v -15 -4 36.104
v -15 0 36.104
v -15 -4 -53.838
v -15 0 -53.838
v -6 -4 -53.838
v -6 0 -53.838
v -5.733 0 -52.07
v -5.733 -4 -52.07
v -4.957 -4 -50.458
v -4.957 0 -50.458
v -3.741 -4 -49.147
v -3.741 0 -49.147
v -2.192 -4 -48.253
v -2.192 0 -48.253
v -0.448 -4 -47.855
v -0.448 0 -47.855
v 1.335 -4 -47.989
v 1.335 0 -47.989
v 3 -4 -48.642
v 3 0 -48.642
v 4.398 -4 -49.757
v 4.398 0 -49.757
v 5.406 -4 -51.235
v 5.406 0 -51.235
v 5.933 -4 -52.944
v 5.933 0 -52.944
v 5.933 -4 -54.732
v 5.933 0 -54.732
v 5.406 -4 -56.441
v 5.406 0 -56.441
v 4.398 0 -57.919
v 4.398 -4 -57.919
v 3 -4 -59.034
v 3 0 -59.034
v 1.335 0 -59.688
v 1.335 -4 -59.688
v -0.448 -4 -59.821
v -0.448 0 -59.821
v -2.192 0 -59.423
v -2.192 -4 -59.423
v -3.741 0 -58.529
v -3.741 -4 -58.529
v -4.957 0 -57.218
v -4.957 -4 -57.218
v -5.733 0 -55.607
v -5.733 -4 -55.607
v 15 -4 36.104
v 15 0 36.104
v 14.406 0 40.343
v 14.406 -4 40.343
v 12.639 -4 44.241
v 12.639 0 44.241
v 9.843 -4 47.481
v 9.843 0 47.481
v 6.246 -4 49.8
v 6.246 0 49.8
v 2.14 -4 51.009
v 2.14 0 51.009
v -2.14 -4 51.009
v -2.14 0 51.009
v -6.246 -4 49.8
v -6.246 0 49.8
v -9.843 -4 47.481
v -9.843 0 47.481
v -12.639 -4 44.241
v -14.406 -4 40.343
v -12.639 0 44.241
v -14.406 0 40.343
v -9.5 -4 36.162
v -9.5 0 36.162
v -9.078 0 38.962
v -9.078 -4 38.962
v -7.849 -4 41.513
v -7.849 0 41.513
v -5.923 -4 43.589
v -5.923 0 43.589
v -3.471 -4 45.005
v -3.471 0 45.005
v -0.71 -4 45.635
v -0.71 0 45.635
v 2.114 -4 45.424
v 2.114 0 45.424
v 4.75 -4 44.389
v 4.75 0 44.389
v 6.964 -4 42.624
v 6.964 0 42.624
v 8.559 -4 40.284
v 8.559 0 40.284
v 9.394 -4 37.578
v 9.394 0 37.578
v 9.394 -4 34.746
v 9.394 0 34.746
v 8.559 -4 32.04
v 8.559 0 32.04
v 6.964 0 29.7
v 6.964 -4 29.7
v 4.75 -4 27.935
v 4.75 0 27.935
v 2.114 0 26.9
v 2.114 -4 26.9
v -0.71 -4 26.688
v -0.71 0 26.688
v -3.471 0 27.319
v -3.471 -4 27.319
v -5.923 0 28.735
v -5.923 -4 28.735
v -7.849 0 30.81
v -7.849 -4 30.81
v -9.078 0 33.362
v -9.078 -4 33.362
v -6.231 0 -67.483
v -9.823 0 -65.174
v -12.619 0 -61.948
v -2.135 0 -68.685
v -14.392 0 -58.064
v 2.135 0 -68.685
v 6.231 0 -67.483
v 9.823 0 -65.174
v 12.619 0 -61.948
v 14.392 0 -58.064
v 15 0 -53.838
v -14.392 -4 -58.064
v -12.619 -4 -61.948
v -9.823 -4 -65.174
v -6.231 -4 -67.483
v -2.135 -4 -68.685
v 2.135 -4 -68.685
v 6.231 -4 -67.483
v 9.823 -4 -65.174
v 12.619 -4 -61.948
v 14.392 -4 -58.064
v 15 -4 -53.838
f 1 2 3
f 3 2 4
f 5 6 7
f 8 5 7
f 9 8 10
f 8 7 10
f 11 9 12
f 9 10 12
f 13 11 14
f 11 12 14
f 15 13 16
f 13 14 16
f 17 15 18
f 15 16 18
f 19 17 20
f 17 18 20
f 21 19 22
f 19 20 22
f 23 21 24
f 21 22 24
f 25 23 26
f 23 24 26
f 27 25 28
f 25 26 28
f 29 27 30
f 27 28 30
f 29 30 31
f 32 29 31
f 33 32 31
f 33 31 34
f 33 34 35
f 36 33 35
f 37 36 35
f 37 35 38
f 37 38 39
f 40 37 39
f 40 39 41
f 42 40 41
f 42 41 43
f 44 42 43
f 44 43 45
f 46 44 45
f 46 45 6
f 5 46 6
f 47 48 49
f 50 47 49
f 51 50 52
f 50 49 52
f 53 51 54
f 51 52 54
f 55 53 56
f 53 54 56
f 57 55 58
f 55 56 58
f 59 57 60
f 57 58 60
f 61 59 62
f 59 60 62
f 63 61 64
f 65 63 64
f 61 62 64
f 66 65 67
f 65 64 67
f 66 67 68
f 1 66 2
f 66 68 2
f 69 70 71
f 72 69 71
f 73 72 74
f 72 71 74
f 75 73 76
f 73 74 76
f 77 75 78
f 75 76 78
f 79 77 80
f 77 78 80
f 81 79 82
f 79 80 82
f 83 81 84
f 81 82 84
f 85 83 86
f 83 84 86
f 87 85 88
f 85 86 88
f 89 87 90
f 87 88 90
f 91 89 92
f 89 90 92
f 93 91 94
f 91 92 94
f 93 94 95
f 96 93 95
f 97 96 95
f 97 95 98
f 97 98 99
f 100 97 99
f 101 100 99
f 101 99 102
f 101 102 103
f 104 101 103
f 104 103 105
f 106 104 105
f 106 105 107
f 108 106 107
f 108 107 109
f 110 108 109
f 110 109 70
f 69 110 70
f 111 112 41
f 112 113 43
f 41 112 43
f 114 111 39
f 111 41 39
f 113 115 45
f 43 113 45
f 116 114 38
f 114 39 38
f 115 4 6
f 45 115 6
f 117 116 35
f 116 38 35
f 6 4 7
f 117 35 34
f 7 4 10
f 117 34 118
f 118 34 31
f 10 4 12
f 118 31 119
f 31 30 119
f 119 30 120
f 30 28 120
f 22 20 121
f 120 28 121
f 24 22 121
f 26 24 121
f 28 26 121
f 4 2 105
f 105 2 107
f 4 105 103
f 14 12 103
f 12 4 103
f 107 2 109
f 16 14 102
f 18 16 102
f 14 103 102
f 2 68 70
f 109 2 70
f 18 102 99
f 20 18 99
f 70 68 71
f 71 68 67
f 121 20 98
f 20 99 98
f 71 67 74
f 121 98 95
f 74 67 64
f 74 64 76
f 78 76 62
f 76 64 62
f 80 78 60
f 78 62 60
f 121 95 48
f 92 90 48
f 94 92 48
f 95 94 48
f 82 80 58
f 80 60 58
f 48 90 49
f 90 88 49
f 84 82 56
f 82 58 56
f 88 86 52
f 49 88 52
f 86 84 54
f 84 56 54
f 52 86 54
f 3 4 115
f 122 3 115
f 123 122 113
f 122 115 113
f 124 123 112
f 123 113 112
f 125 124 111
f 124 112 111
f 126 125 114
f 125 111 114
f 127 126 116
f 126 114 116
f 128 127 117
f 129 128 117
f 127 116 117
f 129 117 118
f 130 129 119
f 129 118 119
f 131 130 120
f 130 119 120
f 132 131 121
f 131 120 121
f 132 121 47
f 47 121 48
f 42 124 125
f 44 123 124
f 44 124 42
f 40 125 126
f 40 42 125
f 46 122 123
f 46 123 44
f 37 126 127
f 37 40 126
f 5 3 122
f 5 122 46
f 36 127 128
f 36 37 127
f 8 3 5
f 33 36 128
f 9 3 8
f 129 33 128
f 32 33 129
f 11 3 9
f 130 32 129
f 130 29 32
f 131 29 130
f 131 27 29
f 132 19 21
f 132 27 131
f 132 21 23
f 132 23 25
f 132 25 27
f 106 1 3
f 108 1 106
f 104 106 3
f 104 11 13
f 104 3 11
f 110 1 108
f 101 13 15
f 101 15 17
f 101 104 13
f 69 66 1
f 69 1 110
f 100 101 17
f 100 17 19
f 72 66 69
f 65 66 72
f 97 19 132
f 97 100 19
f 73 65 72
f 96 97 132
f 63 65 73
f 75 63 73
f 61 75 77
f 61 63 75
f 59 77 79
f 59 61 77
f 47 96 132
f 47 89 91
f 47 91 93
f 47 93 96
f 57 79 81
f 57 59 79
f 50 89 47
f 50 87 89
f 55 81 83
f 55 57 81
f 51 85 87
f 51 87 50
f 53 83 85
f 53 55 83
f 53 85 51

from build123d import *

# Parameters (mm, degrees)
F1_DEPTH = 4
F3_D     = 19
F4_D     = 12


with BuildPart() as f1:
    # F0 (on Front) → F1 (new body)
    with BuildSketch(Plane.XZ):
        with BuildLine():
            Line((15, -53.838078), (15, 36.104428))
            ThreePointArc((15, 36.104428), (0, 51.162033), (-15, 36.104428))
            Line((-15, 36.104428), (-15, -53.838078))
            ThreePointArc((-15, -53.838078), (0, -68.838078), (15, -53.838078))
        make_face()
    extrude(amount=F1_DEPTH)

    # F3 (through all)
    with Locations(Plane.XZ.offset(4)):
        with Locations((0, 36.161922)):
            Hole(F3_D / 2)

    # F4 (through all)
    with Locations(Plane.XZ.offset(4)):
        with Locations((0, -53.838078)):
            Hole(F4_D / 2)


solid = f1.part
